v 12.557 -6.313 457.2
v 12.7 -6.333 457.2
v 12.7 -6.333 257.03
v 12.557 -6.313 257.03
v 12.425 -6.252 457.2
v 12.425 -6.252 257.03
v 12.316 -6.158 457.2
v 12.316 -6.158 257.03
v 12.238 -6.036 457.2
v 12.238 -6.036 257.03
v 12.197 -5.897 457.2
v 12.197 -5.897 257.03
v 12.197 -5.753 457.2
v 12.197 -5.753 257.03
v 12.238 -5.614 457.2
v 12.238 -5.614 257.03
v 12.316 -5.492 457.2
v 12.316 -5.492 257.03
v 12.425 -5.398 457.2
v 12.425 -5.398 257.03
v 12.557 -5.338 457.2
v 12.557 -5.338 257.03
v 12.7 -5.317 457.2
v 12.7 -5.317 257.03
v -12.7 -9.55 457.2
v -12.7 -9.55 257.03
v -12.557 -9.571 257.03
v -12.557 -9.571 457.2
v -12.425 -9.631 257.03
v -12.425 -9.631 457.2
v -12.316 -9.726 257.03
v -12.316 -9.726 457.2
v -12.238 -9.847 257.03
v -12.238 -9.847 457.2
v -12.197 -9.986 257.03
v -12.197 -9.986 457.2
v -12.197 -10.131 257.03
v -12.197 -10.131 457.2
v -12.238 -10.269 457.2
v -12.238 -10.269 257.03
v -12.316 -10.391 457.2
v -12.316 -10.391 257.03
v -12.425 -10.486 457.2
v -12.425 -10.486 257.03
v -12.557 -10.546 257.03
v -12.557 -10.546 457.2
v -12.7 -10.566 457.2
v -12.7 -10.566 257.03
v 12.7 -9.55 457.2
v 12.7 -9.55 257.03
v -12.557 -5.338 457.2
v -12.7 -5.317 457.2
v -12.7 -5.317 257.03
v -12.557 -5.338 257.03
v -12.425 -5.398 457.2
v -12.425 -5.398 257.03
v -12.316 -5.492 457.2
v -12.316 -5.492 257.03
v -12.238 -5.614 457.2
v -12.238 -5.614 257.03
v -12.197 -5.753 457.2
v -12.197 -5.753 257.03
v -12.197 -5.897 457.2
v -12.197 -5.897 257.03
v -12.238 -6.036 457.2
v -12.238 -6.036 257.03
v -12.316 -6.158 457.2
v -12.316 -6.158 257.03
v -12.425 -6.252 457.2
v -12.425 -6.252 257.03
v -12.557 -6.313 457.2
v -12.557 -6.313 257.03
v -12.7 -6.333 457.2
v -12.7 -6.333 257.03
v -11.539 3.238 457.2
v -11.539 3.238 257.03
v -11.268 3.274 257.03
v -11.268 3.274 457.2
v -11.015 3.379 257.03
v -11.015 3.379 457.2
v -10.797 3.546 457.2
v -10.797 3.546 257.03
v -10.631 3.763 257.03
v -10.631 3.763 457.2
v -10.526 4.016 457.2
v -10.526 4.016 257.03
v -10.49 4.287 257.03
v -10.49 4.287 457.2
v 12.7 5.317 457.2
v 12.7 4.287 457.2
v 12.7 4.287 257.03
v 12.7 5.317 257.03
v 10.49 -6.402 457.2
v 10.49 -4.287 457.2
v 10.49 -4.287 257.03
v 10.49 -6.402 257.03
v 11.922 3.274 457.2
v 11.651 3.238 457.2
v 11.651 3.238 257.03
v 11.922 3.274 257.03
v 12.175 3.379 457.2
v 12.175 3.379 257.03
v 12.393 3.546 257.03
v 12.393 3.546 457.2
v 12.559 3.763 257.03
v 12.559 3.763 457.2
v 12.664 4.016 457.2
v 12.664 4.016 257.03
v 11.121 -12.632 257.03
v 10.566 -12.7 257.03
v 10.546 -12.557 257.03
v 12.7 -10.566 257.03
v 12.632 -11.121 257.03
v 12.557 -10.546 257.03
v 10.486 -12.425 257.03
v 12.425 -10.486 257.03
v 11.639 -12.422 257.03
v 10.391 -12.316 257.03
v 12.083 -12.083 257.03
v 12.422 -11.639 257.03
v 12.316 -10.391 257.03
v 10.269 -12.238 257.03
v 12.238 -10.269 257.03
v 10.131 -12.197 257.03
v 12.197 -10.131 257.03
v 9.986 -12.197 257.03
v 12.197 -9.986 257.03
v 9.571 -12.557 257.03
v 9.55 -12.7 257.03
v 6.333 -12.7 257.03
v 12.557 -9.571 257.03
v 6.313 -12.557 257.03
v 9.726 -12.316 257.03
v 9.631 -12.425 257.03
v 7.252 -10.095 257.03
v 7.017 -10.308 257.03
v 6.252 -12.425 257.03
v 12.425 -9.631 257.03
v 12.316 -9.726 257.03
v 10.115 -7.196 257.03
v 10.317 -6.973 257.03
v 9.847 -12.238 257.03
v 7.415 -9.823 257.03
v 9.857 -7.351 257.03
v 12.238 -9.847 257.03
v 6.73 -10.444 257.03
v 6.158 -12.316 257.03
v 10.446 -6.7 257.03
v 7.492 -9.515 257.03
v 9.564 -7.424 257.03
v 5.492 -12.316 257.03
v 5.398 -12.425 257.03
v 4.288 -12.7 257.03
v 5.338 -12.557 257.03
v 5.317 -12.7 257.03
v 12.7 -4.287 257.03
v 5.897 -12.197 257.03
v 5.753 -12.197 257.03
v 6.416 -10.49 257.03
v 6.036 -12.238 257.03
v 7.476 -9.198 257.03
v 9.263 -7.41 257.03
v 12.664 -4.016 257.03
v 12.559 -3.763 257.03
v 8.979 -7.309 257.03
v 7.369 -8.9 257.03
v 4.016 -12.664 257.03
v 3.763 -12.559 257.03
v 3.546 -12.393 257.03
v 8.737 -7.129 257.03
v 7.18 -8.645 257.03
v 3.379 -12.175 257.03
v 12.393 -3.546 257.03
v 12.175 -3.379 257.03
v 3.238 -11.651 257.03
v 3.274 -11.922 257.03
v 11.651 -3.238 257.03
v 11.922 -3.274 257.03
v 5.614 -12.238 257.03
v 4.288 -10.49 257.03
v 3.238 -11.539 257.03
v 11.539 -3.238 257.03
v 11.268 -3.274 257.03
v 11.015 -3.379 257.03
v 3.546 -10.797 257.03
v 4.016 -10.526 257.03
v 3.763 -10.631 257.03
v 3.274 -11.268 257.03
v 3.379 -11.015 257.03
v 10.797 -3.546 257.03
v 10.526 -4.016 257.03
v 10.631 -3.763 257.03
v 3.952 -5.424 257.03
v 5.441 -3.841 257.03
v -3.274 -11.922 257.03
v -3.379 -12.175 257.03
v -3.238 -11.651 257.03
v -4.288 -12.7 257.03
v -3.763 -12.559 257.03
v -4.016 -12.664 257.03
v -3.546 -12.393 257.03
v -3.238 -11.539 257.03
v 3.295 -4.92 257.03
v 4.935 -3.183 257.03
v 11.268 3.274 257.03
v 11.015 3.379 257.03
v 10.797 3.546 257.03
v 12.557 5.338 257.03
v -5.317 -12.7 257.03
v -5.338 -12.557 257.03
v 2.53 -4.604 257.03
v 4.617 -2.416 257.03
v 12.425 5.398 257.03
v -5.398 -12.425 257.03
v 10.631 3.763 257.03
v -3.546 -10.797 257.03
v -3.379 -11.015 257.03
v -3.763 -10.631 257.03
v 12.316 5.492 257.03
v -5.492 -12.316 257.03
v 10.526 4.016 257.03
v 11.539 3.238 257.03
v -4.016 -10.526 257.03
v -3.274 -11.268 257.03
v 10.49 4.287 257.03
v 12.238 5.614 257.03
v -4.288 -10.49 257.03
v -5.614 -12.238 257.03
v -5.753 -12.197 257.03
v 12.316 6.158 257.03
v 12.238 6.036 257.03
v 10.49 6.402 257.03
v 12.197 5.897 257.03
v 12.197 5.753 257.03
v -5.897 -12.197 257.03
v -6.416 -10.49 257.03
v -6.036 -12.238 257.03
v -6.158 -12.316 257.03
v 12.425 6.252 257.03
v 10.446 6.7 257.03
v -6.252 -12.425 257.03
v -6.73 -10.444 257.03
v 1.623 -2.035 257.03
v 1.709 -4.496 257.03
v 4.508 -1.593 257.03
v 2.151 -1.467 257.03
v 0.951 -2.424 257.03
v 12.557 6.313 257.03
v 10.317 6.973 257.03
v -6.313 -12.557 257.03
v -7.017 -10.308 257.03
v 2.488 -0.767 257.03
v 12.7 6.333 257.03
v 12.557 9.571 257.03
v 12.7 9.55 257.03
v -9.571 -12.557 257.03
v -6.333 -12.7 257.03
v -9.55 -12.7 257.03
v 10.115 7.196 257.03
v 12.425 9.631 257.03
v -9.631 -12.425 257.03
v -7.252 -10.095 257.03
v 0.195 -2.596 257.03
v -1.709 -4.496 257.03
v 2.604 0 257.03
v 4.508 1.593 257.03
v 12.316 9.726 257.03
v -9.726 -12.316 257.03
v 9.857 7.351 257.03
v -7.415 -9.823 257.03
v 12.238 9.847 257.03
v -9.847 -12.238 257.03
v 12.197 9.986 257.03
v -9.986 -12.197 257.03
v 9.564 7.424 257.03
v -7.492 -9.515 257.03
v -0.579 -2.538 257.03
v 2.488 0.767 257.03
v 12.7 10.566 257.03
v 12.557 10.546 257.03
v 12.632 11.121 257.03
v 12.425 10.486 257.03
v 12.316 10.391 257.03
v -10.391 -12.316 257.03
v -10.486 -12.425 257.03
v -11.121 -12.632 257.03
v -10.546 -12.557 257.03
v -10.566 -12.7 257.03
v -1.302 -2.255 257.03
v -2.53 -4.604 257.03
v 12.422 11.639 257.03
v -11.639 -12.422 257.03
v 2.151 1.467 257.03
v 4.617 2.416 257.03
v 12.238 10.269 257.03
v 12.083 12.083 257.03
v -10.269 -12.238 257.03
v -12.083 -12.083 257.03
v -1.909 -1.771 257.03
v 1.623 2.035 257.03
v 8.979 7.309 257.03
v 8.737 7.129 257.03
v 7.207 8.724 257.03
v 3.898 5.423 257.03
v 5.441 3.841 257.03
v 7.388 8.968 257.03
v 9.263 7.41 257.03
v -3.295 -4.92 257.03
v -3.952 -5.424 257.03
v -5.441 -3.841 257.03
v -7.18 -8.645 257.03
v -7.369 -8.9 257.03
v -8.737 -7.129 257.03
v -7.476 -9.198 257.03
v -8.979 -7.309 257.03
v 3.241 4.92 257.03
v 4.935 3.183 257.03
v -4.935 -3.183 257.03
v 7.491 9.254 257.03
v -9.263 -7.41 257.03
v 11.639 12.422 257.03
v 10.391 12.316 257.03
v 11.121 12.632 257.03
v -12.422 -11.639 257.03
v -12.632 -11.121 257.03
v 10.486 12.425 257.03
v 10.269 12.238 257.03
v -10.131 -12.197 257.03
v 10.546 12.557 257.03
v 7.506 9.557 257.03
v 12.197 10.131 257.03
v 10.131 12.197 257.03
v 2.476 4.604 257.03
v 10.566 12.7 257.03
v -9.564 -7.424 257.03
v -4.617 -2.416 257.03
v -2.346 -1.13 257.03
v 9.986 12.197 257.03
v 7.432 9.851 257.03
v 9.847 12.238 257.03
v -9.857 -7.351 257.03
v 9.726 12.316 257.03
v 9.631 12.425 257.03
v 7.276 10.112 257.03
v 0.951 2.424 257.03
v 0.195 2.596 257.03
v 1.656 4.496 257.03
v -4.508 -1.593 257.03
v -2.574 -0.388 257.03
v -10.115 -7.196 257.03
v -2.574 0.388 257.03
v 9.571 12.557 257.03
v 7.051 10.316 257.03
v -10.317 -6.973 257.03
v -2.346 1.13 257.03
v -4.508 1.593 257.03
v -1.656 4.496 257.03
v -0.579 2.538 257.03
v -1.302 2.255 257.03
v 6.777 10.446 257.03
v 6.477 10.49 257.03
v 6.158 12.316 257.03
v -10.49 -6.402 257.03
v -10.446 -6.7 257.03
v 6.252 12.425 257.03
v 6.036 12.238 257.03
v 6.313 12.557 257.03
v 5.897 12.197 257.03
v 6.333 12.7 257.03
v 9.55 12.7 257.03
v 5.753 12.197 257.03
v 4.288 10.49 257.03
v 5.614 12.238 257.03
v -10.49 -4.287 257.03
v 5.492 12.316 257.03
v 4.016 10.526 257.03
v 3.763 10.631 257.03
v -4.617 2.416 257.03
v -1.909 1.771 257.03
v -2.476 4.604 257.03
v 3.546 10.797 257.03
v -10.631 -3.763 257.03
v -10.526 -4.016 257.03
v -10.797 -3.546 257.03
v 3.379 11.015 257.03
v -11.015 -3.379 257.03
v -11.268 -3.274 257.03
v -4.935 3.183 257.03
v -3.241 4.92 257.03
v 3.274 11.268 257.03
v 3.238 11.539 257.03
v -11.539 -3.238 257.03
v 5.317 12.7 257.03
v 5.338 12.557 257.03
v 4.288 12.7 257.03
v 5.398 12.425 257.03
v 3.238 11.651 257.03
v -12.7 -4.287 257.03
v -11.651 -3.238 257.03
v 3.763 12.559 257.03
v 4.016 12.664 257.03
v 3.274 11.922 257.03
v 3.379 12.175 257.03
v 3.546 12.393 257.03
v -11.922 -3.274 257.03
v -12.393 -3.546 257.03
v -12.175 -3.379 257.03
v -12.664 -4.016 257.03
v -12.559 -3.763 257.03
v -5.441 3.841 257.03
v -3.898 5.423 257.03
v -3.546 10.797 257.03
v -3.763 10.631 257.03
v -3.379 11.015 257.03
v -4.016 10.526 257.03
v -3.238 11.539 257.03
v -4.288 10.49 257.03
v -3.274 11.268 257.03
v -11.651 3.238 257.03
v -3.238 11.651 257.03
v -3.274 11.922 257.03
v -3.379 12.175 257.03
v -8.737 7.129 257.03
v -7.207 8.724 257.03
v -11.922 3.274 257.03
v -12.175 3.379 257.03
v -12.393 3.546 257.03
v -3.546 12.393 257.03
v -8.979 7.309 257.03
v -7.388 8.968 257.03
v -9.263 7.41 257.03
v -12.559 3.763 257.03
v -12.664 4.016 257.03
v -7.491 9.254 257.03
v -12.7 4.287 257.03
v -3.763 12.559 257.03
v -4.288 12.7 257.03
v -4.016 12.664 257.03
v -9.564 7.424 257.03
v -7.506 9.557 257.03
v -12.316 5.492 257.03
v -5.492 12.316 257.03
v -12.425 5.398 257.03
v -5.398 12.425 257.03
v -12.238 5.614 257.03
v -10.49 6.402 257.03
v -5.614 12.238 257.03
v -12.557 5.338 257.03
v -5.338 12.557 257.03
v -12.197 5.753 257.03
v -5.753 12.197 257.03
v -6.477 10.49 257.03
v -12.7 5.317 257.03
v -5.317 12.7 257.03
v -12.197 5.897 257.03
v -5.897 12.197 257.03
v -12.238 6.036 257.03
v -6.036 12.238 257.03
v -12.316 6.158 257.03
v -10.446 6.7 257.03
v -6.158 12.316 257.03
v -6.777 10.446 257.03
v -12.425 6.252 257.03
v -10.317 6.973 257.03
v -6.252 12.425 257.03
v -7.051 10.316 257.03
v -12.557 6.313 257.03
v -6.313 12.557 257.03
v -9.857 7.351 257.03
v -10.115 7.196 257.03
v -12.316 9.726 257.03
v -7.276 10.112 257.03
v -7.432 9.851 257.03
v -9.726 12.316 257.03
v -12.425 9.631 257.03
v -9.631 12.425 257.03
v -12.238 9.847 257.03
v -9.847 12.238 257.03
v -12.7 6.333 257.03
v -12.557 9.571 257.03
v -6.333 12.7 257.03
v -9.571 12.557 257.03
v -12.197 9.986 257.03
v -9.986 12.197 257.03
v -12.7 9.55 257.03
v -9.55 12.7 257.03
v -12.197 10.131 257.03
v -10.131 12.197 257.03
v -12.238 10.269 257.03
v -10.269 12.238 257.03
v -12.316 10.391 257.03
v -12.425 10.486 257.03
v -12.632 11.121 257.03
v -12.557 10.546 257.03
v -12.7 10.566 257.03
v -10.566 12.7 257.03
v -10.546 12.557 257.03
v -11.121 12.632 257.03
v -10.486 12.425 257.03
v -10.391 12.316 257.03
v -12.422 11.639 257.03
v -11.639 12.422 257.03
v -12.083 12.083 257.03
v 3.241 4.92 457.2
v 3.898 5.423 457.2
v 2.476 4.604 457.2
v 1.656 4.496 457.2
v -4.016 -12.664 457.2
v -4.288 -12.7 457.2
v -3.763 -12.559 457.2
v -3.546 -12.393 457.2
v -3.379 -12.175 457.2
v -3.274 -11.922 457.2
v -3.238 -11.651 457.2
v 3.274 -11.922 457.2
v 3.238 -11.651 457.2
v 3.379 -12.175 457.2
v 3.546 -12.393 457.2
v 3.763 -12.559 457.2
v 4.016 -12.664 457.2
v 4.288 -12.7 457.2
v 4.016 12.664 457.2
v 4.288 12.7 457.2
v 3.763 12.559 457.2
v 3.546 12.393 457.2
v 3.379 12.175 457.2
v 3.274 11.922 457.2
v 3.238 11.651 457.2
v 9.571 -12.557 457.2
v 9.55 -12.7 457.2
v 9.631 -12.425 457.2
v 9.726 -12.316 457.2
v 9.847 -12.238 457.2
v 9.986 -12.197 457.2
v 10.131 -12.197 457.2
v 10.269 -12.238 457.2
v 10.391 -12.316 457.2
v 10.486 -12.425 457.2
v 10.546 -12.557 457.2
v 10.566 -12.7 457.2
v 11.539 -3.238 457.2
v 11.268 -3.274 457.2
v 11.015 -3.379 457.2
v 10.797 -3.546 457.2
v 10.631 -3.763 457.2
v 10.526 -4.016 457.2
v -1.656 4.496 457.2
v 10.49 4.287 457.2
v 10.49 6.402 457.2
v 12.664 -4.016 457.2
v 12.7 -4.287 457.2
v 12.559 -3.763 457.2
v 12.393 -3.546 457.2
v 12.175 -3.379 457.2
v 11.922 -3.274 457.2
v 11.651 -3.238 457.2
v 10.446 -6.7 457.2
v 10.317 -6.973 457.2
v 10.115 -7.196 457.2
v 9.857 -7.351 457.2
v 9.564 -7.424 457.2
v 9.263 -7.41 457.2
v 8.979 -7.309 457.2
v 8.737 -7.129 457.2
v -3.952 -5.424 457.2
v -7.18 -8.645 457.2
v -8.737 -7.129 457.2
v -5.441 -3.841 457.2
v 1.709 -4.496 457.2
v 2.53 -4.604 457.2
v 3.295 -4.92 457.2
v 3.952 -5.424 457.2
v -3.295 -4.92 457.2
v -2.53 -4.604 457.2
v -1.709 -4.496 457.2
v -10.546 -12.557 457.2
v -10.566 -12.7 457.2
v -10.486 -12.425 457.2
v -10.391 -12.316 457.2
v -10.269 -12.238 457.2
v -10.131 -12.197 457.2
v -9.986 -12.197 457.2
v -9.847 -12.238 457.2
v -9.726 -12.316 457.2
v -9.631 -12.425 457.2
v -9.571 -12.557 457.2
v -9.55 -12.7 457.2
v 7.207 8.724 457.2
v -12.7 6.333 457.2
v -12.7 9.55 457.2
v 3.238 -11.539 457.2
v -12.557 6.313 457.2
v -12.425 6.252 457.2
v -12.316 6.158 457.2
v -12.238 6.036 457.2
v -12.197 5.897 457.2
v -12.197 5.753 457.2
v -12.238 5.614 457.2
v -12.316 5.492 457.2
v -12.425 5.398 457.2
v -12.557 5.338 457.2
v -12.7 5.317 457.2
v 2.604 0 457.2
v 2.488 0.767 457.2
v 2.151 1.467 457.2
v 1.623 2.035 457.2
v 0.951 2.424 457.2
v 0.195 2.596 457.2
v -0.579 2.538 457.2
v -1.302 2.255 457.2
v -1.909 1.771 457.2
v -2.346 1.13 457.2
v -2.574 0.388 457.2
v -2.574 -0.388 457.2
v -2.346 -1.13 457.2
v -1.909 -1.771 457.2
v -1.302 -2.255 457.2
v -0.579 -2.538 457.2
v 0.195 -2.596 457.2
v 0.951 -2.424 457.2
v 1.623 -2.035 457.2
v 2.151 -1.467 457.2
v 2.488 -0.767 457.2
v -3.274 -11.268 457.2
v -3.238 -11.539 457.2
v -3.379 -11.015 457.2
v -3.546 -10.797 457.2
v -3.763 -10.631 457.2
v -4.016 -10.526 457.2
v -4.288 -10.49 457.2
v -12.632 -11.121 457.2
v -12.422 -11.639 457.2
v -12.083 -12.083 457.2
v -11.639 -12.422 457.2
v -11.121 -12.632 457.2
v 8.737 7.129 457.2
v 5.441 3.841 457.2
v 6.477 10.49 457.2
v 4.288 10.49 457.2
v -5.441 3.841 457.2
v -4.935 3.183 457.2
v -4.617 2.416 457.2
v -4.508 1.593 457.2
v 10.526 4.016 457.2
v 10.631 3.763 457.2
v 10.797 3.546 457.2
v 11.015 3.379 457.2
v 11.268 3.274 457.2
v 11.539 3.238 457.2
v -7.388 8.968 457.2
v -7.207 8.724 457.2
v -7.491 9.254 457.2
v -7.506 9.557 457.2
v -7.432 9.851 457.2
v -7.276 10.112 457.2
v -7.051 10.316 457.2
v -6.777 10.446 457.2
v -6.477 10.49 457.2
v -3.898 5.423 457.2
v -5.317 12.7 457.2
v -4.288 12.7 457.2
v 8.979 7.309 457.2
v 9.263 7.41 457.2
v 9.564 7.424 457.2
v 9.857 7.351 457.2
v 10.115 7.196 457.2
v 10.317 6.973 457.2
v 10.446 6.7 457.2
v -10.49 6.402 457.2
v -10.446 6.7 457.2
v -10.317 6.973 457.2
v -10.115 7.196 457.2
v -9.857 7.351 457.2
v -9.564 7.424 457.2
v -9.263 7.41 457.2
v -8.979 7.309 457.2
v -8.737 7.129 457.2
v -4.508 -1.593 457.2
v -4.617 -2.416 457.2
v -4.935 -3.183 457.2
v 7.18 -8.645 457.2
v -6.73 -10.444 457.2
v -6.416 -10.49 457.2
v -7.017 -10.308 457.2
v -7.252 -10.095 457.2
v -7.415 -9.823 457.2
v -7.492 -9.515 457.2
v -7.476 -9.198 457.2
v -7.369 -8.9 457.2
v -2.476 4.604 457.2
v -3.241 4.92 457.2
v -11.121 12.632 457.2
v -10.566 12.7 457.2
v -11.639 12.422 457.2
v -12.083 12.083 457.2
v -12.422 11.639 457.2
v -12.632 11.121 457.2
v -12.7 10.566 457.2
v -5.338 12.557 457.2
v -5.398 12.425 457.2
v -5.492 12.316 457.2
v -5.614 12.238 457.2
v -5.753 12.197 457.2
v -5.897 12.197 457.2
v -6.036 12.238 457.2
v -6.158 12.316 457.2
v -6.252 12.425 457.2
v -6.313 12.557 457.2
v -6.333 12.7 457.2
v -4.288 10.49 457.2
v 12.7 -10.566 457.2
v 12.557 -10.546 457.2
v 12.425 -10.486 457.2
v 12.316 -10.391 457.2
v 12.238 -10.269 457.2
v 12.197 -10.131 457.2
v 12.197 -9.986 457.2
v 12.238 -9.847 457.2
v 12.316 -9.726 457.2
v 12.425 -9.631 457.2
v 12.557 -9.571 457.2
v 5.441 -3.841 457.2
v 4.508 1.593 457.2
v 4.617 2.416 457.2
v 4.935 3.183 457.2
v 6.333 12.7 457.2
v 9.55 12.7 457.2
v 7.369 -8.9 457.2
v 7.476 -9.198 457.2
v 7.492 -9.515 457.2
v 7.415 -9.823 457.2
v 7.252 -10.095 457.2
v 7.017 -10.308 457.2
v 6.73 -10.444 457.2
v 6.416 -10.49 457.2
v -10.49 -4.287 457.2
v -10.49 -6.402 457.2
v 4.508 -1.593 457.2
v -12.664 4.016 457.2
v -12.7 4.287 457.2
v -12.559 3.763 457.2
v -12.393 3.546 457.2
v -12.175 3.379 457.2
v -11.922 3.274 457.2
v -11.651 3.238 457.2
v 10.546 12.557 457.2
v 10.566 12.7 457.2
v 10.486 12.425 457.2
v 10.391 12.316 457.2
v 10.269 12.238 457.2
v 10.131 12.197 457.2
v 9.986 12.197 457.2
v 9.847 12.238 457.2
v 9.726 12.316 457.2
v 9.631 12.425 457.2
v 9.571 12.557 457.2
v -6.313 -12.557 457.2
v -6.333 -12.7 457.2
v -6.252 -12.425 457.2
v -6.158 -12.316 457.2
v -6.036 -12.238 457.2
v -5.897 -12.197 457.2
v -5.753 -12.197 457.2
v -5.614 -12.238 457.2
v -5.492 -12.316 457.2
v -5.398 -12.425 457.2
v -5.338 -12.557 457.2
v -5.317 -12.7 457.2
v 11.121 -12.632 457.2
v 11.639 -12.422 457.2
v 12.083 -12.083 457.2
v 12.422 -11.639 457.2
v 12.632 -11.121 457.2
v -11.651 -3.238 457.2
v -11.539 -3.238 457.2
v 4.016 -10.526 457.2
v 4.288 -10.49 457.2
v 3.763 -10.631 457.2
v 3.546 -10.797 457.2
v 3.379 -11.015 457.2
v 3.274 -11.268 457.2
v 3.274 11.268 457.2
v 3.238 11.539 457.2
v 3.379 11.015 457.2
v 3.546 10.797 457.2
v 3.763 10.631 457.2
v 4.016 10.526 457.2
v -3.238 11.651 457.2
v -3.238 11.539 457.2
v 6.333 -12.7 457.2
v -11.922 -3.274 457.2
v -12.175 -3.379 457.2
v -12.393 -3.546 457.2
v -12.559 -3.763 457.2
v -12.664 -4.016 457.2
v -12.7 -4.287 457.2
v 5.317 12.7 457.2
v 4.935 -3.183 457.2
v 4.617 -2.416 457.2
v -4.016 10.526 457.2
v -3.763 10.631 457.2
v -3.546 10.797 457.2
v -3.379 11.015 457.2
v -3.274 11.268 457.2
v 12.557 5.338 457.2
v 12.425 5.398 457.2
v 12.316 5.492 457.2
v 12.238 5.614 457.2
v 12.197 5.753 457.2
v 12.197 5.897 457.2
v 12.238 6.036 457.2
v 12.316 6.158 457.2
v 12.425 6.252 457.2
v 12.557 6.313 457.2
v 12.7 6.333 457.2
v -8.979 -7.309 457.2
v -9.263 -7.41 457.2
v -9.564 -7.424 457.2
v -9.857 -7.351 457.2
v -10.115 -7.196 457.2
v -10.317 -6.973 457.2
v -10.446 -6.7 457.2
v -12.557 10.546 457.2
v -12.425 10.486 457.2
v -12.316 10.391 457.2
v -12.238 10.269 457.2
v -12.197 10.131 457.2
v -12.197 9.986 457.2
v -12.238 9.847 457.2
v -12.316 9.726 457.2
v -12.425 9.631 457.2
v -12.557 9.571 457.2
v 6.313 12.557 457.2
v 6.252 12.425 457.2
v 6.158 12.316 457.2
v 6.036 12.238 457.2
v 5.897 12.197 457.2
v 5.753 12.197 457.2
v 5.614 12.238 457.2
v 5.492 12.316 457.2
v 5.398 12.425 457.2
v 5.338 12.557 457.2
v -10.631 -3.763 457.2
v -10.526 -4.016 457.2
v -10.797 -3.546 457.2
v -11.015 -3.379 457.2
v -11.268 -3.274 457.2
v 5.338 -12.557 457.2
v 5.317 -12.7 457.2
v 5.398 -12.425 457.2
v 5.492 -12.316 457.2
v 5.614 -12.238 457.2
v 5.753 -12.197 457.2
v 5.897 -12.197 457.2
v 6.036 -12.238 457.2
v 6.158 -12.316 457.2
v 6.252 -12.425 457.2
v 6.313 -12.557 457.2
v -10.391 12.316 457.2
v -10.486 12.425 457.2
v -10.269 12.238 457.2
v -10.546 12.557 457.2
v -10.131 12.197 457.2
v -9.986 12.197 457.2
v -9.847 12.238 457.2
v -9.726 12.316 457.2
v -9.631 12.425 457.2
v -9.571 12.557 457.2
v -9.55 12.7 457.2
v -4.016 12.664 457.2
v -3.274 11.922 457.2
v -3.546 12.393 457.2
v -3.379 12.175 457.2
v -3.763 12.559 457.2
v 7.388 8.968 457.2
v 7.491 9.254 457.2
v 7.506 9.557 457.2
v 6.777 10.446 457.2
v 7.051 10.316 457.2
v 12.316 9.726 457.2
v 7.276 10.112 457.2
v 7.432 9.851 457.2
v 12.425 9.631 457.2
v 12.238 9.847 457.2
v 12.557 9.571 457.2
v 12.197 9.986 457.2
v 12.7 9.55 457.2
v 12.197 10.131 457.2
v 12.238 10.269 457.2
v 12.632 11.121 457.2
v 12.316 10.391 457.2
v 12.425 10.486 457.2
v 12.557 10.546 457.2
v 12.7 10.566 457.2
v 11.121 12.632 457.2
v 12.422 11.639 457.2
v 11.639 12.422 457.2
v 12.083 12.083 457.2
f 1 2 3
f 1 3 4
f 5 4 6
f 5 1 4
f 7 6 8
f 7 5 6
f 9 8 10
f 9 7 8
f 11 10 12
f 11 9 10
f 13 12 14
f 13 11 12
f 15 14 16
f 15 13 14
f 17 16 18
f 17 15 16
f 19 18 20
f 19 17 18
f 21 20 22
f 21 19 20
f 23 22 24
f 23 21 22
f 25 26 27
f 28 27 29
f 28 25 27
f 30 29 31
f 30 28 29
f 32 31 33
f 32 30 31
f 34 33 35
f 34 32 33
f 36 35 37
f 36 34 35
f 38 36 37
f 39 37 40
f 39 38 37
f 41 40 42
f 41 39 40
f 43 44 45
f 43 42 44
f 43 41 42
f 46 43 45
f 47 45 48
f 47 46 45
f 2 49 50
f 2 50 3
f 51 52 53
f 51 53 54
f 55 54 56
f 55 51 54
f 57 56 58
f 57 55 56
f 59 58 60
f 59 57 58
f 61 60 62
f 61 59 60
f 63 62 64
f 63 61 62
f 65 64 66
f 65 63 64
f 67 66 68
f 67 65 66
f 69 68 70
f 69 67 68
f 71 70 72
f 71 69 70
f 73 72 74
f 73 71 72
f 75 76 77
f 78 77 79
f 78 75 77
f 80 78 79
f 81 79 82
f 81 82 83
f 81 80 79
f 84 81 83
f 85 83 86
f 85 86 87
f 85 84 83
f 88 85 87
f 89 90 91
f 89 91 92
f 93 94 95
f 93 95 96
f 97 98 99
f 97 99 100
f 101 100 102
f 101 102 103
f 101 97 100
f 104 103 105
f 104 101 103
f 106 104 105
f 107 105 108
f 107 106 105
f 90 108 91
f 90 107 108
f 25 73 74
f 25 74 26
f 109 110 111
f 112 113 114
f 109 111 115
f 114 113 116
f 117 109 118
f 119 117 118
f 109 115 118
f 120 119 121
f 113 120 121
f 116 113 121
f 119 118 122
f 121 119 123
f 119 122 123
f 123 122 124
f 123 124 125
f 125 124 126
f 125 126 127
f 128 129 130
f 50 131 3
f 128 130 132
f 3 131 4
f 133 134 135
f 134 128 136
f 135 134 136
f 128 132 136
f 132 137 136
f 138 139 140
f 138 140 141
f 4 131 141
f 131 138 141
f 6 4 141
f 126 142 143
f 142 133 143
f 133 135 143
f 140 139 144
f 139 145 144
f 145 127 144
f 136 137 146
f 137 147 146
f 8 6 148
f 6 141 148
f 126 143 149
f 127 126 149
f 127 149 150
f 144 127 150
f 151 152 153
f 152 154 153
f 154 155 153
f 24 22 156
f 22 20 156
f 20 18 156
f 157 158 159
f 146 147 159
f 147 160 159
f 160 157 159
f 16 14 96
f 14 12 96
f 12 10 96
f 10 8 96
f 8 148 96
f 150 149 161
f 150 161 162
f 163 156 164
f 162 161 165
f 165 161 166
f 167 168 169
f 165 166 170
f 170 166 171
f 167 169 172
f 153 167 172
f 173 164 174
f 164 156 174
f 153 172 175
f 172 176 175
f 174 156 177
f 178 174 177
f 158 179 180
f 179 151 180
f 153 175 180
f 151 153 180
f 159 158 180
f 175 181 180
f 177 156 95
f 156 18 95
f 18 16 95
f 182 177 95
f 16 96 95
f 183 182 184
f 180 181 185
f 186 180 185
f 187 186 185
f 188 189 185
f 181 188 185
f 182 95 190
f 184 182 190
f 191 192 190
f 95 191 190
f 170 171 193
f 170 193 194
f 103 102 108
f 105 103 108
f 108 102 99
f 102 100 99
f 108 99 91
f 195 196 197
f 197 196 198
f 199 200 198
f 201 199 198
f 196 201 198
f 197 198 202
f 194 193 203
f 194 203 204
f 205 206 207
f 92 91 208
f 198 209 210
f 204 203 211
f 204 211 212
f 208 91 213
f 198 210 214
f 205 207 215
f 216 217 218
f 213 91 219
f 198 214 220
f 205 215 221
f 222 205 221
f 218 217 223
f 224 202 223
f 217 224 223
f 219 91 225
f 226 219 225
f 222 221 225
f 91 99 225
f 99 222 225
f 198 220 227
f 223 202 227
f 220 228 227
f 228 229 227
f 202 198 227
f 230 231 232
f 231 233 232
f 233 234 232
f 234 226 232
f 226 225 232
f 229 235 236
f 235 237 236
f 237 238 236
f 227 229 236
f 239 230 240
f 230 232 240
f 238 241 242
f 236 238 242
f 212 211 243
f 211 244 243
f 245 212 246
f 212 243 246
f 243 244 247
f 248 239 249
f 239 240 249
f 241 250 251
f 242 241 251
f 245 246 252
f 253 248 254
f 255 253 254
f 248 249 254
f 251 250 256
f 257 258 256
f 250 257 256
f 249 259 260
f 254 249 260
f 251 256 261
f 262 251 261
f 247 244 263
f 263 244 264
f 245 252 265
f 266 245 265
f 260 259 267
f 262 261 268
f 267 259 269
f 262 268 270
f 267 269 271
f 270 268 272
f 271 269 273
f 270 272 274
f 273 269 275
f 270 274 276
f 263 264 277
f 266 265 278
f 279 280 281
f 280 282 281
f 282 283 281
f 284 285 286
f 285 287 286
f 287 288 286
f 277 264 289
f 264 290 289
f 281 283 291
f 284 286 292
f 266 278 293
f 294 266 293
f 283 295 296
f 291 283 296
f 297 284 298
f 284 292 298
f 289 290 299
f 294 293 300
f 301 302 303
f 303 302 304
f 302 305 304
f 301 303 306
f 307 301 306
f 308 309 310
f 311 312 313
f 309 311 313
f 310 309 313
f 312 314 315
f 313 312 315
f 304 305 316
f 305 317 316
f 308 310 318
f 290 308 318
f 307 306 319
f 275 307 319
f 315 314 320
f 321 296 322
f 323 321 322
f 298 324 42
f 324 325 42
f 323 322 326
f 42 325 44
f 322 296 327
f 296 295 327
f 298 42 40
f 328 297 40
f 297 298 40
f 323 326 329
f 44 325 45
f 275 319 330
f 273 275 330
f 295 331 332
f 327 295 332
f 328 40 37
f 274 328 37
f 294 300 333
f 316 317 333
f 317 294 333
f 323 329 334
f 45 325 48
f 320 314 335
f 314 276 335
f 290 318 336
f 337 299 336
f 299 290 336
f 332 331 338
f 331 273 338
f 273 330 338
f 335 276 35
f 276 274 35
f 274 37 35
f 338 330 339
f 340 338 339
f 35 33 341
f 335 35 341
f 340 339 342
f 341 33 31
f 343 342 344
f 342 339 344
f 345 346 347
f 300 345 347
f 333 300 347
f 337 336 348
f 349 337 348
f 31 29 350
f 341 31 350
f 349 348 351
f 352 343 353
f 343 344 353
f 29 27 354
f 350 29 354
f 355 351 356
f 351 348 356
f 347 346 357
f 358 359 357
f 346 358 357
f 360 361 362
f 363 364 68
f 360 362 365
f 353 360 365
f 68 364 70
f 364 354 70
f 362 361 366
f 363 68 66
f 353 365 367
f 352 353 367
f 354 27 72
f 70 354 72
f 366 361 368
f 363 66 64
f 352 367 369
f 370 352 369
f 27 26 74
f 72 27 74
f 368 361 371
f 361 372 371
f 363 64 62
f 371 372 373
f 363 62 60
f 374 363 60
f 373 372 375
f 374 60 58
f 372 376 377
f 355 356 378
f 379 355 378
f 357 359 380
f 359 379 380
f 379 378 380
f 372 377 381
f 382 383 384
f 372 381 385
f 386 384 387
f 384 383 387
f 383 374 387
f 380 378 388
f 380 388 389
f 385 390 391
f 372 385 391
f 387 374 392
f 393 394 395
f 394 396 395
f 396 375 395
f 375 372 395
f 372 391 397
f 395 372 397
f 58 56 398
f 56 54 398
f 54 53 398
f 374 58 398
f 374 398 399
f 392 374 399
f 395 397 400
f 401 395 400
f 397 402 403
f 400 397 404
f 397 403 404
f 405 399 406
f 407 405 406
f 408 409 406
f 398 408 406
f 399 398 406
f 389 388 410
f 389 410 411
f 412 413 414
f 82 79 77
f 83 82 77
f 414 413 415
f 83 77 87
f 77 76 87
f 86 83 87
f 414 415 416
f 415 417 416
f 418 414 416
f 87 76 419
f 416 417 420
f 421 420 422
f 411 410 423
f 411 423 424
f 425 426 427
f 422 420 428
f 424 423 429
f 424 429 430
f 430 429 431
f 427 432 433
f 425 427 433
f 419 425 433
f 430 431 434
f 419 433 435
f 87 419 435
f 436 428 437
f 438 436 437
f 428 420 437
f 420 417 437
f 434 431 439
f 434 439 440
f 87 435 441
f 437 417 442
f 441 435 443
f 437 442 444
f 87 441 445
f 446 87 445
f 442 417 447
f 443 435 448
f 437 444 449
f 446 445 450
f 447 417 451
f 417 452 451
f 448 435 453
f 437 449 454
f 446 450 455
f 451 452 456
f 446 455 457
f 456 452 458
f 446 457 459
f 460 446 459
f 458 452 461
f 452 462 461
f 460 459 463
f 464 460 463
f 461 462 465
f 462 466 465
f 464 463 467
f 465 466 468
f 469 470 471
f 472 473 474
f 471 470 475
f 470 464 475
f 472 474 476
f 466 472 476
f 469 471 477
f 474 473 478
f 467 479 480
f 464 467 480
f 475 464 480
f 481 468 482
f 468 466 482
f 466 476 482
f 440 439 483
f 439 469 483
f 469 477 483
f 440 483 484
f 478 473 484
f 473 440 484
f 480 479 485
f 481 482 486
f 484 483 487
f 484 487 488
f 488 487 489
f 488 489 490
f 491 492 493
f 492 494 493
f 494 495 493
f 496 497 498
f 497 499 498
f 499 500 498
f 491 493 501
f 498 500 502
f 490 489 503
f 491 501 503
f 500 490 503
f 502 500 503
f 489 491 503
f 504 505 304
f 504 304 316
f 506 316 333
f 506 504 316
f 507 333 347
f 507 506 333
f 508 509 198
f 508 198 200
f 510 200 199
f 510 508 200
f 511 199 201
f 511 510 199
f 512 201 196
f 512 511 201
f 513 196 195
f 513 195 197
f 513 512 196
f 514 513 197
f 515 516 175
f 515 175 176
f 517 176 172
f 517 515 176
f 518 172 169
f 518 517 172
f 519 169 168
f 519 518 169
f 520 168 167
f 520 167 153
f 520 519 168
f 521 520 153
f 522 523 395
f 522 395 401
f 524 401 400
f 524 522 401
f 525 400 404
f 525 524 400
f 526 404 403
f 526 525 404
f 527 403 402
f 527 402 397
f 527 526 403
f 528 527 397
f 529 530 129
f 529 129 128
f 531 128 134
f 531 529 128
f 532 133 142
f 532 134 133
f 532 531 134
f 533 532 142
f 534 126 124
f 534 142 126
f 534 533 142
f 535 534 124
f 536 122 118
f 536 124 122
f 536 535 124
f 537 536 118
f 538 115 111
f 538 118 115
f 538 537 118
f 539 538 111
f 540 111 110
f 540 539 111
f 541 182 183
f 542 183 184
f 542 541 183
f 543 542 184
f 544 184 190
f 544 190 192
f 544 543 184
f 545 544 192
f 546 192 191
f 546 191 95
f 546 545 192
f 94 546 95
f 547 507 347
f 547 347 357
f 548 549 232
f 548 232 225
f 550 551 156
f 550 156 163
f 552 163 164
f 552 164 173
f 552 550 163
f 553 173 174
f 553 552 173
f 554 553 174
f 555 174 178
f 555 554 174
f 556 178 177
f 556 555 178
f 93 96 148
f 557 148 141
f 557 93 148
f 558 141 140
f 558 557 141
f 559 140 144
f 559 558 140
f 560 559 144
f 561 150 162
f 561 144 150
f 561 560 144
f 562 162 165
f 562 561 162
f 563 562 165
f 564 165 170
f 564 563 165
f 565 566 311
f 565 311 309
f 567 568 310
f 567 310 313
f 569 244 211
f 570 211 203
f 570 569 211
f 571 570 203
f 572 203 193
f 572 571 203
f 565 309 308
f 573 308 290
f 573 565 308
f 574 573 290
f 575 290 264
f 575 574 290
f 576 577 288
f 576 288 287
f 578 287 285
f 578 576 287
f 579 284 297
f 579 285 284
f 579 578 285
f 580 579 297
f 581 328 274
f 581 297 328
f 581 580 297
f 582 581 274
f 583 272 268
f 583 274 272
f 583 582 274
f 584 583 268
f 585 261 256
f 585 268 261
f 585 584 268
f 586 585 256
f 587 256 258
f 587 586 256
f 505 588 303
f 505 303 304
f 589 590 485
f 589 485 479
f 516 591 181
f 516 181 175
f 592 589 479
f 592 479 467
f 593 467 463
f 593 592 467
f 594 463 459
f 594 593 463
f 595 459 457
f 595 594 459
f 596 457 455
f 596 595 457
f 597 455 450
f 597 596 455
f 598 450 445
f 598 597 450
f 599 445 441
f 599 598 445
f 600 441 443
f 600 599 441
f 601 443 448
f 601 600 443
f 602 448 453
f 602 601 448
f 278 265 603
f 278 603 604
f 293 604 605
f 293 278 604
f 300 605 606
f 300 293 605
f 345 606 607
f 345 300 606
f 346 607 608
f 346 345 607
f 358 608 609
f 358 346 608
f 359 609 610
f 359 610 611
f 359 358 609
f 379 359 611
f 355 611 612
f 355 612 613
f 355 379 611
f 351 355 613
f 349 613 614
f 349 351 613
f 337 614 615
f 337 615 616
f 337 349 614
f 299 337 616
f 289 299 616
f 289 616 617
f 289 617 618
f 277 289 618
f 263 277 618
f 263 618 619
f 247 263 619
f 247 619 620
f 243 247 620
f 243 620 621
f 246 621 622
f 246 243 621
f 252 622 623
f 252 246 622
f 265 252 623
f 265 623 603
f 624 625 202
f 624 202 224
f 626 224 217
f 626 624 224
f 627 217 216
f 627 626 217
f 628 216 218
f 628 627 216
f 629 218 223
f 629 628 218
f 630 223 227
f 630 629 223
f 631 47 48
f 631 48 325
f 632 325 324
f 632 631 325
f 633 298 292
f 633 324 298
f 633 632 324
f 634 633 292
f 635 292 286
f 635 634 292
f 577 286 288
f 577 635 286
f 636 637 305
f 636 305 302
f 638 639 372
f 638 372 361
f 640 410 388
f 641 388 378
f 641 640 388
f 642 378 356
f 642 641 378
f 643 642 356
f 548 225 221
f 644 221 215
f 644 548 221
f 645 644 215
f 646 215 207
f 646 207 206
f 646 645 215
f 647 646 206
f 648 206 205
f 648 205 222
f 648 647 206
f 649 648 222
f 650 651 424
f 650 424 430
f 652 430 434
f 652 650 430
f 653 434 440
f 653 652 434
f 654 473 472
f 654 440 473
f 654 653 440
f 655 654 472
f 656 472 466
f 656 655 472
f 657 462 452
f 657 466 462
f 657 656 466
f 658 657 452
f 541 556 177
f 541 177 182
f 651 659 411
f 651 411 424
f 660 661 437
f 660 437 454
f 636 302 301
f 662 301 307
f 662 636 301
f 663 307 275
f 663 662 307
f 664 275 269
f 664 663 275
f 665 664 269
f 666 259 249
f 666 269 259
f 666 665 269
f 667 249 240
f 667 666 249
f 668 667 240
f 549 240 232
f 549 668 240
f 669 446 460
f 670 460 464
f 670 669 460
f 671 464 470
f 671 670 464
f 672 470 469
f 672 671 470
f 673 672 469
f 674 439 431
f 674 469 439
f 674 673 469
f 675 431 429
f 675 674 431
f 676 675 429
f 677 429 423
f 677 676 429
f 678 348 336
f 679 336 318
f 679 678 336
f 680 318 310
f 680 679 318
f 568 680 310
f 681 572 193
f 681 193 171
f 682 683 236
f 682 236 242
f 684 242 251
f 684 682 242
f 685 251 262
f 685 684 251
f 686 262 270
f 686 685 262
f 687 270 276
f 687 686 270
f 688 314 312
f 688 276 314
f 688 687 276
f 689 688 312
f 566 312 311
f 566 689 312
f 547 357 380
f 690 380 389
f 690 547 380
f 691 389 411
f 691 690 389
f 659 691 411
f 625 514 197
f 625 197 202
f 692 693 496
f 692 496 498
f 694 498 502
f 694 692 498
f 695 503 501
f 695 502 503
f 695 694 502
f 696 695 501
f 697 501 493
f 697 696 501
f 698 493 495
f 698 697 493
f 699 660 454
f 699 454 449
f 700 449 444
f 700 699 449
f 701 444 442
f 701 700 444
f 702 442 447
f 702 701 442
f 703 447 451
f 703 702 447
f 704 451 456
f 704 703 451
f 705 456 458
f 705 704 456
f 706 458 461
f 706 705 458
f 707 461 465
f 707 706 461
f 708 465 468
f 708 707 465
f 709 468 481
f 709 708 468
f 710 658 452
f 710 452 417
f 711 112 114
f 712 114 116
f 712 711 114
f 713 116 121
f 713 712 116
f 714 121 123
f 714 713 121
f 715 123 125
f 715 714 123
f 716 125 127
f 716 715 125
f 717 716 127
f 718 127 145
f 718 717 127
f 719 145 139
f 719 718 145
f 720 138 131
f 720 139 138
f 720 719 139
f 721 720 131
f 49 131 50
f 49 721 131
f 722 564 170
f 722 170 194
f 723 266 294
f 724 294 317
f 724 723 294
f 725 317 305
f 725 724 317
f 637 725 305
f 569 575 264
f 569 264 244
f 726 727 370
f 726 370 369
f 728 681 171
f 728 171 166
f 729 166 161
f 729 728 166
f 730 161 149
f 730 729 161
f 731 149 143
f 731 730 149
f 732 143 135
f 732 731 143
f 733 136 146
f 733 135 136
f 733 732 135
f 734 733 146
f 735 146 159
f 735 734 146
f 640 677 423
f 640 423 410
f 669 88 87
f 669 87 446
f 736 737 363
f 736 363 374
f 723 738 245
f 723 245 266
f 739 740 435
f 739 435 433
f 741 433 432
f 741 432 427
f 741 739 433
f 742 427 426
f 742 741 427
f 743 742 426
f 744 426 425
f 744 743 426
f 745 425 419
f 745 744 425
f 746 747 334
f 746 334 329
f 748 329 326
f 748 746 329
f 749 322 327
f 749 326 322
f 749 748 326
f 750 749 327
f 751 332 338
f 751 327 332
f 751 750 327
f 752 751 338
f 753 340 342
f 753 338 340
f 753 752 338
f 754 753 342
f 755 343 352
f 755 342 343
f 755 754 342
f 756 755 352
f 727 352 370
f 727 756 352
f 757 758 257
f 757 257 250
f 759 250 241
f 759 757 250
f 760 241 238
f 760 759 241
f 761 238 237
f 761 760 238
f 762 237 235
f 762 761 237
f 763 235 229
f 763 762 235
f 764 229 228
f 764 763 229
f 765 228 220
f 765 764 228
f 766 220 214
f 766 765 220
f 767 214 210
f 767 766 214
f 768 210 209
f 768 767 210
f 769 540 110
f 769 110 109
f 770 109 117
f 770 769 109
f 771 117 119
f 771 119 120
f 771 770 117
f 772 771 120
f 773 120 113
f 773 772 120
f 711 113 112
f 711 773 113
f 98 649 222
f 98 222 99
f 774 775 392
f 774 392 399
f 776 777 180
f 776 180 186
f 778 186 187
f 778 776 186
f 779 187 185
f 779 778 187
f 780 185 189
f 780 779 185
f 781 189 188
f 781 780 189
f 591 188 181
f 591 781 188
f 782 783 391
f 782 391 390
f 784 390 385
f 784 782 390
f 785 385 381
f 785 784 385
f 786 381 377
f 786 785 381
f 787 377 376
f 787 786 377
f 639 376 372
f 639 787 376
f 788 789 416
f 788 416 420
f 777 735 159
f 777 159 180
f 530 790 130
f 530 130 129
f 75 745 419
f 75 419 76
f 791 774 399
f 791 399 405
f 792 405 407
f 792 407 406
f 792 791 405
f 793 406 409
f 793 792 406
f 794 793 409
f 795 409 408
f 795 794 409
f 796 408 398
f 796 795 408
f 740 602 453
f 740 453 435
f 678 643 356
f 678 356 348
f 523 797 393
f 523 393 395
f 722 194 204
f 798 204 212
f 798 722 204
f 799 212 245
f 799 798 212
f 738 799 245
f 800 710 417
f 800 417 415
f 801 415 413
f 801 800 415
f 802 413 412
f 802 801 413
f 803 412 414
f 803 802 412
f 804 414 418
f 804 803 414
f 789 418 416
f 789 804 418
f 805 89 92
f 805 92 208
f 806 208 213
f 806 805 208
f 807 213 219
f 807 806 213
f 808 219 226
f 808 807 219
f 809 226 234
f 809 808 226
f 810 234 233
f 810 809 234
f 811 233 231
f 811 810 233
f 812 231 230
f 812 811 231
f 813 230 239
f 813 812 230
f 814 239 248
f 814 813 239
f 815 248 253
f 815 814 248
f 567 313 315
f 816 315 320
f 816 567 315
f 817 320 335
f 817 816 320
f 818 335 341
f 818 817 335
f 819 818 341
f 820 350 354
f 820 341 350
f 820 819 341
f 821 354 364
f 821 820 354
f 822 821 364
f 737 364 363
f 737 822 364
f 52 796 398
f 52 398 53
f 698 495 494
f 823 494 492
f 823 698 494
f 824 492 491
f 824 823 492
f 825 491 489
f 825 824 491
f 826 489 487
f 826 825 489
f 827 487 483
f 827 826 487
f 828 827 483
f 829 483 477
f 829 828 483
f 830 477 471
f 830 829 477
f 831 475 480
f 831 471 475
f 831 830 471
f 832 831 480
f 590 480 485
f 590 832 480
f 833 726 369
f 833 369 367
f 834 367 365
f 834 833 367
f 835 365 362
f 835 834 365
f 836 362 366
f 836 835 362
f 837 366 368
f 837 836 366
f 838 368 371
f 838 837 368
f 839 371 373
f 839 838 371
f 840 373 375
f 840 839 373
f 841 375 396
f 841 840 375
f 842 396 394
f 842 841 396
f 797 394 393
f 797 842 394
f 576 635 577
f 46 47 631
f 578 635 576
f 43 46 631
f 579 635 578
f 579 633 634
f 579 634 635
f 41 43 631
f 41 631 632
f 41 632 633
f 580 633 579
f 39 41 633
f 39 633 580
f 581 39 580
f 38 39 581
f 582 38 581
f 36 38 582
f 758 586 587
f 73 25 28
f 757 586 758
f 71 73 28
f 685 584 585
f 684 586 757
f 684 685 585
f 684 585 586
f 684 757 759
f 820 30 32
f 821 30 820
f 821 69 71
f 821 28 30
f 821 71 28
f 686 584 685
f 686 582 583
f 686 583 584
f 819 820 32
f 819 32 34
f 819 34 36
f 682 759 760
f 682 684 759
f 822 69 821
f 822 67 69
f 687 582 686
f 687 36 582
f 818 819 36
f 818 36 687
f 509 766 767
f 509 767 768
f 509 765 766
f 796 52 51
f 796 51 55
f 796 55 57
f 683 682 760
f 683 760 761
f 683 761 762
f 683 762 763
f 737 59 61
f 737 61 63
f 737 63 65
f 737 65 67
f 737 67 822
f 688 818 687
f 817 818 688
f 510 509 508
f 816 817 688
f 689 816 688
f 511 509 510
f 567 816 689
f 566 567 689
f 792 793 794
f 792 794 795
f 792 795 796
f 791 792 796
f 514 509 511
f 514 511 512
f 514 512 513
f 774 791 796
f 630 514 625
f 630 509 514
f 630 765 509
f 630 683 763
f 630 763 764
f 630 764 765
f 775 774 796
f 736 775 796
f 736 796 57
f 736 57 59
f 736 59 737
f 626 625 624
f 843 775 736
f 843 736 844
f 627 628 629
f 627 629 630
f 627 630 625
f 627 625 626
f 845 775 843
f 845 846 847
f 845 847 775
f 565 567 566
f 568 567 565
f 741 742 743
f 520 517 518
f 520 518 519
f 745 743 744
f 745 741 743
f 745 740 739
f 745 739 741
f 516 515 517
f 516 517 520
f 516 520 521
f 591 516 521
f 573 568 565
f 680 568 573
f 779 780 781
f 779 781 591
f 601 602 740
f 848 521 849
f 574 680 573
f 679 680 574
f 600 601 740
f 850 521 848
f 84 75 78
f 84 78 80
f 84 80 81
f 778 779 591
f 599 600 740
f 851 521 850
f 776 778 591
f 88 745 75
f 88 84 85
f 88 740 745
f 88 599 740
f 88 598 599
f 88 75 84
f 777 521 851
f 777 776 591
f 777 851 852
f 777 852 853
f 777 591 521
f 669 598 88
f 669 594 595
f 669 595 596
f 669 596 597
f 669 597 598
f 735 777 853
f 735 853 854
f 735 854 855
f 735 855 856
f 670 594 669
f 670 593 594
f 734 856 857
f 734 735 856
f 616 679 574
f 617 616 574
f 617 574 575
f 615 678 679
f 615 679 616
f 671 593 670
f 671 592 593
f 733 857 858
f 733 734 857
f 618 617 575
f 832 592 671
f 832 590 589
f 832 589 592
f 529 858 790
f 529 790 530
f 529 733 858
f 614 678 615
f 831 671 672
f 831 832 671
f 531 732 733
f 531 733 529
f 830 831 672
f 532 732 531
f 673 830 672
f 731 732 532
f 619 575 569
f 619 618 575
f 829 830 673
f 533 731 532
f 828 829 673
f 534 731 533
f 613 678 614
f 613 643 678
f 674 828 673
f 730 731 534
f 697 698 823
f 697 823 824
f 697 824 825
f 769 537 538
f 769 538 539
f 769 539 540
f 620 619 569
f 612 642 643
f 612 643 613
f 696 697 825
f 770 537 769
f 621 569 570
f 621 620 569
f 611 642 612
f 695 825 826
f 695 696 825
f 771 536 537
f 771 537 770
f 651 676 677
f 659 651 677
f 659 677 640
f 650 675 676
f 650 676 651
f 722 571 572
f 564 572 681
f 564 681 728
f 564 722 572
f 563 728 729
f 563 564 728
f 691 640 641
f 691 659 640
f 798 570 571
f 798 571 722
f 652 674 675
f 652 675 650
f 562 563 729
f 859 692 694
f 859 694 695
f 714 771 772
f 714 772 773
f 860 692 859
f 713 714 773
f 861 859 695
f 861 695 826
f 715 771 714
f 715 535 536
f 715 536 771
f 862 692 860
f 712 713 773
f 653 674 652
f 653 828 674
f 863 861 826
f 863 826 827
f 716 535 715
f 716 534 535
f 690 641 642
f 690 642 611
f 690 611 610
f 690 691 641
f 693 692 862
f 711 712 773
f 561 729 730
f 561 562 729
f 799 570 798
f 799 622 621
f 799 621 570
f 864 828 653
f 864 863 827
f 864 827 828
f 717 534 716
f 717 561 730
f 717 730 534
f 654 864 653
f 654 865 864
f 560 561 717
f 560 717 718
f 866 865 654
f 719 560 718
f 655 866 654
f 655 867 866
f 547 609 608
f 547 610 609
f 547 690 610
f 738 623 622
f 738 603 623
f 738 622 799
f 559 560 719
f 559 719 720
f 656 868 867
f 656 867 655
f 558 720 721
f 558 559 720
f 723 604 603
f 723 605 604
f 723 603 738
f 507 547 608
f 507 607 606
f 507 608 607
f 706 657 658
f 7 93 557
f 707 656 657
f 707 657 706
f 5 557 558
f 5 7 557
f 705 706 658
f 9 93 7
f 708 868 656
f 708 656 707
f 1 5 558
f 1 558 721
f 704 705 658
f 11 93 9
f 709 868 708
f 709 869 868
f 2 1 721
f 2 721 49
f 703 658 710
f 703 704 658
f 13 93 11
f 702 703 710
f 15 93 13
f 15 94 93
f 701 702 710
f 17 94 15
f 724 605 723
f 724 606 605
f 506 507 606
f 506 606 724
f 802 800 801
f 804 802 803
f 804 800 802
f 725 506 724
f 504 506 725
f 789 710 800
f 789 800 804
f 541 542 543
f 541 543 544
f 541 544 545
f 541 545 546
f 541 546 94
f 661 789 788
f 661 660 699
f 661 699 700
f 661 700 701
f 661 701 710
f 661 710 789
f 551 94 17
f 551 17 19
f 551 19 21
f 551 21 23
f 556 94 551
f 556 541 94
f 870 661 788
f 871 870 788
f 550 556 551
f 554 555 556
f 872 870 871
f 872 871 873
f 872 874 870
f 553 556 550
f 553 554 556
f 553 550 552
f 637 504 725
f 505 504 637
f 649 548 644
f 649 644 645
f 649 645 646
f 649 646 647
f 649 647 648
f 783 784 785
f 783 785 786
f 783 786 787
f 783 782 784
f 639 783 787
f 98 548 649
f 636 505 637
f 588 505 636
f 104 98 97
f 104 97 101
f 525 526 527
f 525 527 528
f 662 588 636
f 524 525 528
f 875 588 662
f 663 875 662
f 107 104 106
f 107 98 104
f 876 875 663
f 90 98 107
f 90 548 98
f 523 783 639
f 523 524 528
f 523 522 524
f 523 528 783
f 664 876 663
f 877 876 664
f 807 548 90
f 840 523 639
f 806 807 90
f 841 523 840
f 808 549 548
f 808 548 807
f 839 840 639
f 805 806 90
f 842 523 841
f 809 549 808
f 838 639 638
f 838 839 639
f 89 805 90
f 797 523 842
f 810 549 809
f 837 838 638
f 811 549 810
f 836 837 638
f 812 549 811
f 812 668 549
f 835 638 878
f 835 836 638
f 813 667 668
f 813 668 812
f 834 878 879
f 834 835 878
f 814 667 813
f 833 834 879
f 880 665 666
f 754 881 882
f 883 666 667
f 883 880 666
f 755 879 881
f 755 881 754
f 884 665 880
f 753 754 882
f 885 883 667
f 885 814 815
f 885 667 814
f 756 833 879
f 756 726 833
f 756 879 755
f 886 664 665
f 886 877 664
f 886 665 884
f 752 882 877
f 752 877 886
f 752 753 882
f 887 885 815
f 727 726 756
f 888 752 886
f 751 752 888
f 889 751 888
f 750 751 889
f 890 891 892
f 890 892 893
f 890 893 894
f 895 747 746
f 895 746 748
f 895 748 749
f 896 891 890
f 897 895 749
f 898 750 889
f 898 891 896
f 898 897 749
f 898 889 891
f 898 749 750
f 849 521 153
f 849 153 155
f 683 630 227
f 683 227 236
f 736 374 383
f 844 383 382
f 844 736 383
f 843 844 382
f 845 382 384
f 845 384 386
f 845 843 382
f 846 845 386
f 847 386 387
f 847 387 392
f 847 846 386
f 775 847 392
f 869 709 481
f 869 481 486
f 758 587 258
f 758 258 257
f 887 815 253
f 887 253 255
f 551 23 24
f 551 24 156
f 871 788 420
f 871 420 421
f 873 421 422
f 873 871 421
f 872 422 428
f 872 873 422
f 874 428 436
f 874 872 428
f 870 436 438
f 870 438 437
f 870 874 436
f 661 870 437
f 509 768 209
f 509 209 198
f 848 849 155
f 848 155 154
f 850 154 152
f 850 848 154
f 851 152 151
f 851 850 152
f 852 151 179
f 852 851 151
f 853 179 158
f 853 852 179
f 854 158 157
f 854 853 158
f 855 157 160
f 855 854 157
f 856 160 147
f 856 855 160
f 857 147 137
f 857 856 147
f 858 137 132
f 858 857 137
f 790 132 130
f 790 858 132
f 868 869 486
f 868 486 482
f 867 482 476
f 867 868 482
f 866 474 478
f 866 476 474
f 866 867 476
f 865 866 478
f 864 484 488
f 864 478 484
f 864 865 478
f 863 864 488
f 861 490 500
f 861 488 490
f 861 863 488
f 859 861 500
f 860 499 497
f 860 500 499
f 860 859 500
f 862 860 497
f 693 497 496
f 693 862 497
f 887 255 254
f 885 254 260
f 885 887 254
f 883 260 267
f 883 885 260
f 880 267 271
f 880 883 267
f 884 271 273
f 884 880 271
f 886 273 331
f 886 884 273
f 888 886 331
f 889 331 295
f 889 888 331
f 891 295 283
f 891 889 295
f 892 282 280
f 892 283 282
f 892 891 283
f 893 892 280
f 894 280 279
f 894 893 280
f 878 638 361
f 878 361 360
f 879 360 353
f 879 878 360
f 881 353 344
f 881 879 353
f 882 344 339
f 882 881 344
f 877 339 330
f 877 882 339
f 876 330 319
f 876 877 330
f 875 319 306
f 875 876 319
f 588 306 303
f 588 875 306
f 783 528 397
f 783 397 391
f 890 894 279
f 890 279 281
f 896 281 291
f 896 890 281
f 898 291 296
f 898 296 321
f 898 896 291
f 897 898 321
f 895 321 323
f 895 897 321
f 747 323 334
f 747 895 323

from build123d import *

# Parameters (mm, degrees)
SKETCH1_R               = 2.6035
BOSS_EXTRUDE1_DEPTH     = 457.2
CUT_EXTRUDE2_DEPTH      = 4.318
CUT_EXTRUDE2_DEPTH_BACK = 26.924


with BuildPart() as part:
    # Sketch1 → Boss-Extrude1 (new body, symmetric)
    with BuildSketch(Plane.XY):
        with BuildLine():
            Line((-7.179650497, -8.645192506), (-3.952270251, -5.423690499))
            ThreePointArc((-3.952270251, -5.423690499), (-2.922936451, -4.736929036), (-1.709253557, -4.4958))
            Line((-1.709253557, -4.4958), (1.709253557, -4.4958))
            ThreePointArc((1.709253557, -4.4958), (2.922936451, -4.736929036), (3.952270251, -5.423690499))
            Line((3.952270251, -5.423690499), (7.179650497, -8.645192506))
            ThreePointArc((7.179650497, -8.645192506), (7.41473083, -9.822813117), (6.416408329, -10.4902))
            Line((6.416408329, -10.4902), (4.287512407, -10.4902))
            ThreePointArc((4.287512407, -10.4902), (3.54574862, -10.79744862), (3.2385, -11.539212407))
            Line((3.2385, -11.539212407), (3.2385, -11.650987593))
            ThreePointArc((3.2385, -11.650987593), (3.54574862, -12.39275138), (4.287512407, -12.7))
            Line((4.287512407, -12.7), (5.317126718, -12.7))
            ThreePointArc((5.317126718, -12.7), (5.825126718, -12.192), (6.333126718, -12.7))
            Line((6.333126718, -12.7), (9.550443118, -12.7))
            ThreePointArc((9.550443118, -12.7), (10.058366869, -12.192000006), (10.566443095, -12.699847501))
            ThreePointArc((10.566443095, -12.699847501), (12.082537762, -12.08250727), (12.699846982, -10.566399977))
            ThreePointArc((12.699846982, -10.566399977), (12.192000006, -10.058323491), (12.7, -9.5504))
            Line((12.7, -9.5504), (12.7, -6.3330836))
            ThreePointArc((12.7, -6.3330836), (12.192, -5.8250836), (12.7, -5.3170836))
            Line((12.7, -5.3170836), (12.7, -4.287469289))
            ThreePointArc((12.7, -4.287469289), (12.39275138, -3.545705502), (11.650987593, -3.238456882))
            Line((11.650987593, -3.238456882), (11.539212407, -3.238456882))
            ThreePointArc((11.539212407, -3.238456882), (10.79744862, -3.545705502), (10.4902, -4.287469289))
            Line((10.4902, -4.287469289), (10.4902, -6.402089023))
            ThreePointArc((10.4902, -6.402089023), (9.856505071, -7.351067942), (8.737131347, -7.129408934))
            Line((8.737131347, -7.129408934), (5.441005833, -3.840816462))
            ThreePointArc((5.441005833, -3.840816462), (4.750877967, -2.809883091), (4.5085, -1.593185507))
            Line((4.5085, -1.593185507), (4.5085, 1.593185507))
            ThreePointArc((4.5085, 1.593185507), (4.750877967, 2.809883091), (5.441005833, 3.840816462))
            Line((5.441005833, 3.840816462), (8.737131347, 7.129408934))
            ThreePointArc((8.737131347, 7.129408934), (9.856505071, 7.351067942), (10.4902, 6.402089023))
            Line((10.4902, 6.402089023), (10.4902, 4.287469289))
            ThreePointArc((10.4902, 4.287469289), (10.79744862, 3.545705502), (11.539212407, 3.238456882))
            Line((11.539212407, 3.238456882), (11.650987593, 3.238456882))
            ThreePointArc((11.650987593, 3.238456882), (12.39275138, 3.545705502), (12.7, 4.287469289))
            Line((12.7, 4.287469289), (12.7, 5.3170836))
            ThreePointArc((12.7, 5.3170836), (12.192, 5.8250836), (12.7, 6.3330836))
            Line((12.7, 6.3330836), (12.7, 9.5504))
            ThreePointArc((12.7, 9.5504), (12.192000006, 10.058323491), (12.699846982, 10.566399977))
            ThreePointArc((12.699846982, 10.566399977), (12.082537762, 12.08250727), (10.566443095, 12.699847501))
            ThreePointArc((10.566443095, 12.699847501), (10.058366869, 12.192000006), (9.550443118, 12.7))
            Line((9.550443118, 12.7), (6.333126718, 12.7))
            ThreePointArc((6.333126718, 12.7), (5.825126718, 12.192), (5.317126718, 12.7))
            Line((5.317126718, 12.7), (4.287512407, 12.7))
            ThreePointArc((4.287512407, 12.7), (3.54574862, 12.39275138), (3.2385, 11.650987593))
            Line((3.2385, 11.650987593), (3.2385, 11.539212407))
            ThreePointArc((3.2385, 11.539212407), (3.54574862, 10.79744862), (4.287512407, 10.4902))
            Line((4.287512407, 10.4902), (6.476788598, 10.4902))
            ThreePointArc((6.476788598, 10.4902), (7.432222385, 9.85140422), (7.207036008, 8.724370562))
            Line((7.207036008, 8.724370562), (3.898272566, 5.423169045))
            ThreePointArc((3.898272566, 5.423169045), (2.869120213, 4.736787962), (1.655778399, 4.4958))
            Line((1.655778399, 4.4958), (-1.655778399, 4.4958))
            ThreePointArc((-1.655778399, 4.4958), (-2.869120213, 4.736787962), (-3.898272566, 5.423169045))
            Line((-3.898272566, 5.423169045), (-7.207036008, 8.724370562))
            ThreePointArc((-7.207036008, 8.724370562), (-7.432222385, 9.85140422), (-6.476788598, 10.4902))
            Line((-6.476788598, 10.4902), (-4.287512407, 10.4902))
            ThreePointArc((-4.287512407, 10.4902), (-3.54574862, 10.79744862), (-3.2385, 11.539212407))
            Line((-3.2385, 11.539212407), (-3.2385, 11.650987593))
            ThreePointArc((-3.2385, 11.650987593), (-3.54574862, 12.39275138), (-4.287512407, 12.7))
            Line((-4.287512407, 12.7), (-5.317126718, 12.7))
            ThreePointArc((-5.317126718, 12.7), (-5.825126718, 12.192), (-6.333126718, 12.7))
            Line((-6.333126718, 12.7), (-9.550443118, 12.7))
            ThreePointArc((-9.550443118, 12.7), (-10.058366869, 12.192000006), (-10.566443095, 12.699847501))
            ThreePointArc((-10.566443095, 12.699847501), (-12.082537762, 12.08250727), (-12.699846982, 10.566399977))
            ThreePointArc((-12.699846982, 10.566399977), (-12.192000006, 10.058323491), (-12.7, 9.5504))
            Line((-12.7, 9.5504), (-12.7, 6.3330836))
            ThreePointArc((-12.7, 6.3330836), (-12.192, 5.8250836), (-12.7, 5.3170836))
            Line((-12.7, 5.3170836), (-12.7, 4.287469289))
            ThreePointArc((-12.7, 4.287469289), (-12.39275138, 3.545705502), (-11.650987593, 3.238456882))
            Line((-11.650987593, 3.238456882), (-11.539212407, 3.238456882))
            ThreePointArc((-11.539212407, 3.238456882), (-10.79744862, 3.545705502), (-10.4902, 4.287469289))
            Line((-10.4902, 4.287469289), (-10.4902, 6.402089023))
            ThreePointArc((-10.4902, 6.402089023), (-9.856505071, 7.351067942), (-8.737131347, 7.129408934))
            Line((-8.737131347, 7.129408934), (-5.441005833, 3.840816462))
            ThreePointArc((-5.441005833, 3.840816462), (-4.750877967, 2.809883091), (-4.5085, 1.593185507))
            Line((-4.5085, 1.593185507), (-4.5085, -1.593185507))
            ThreePointArc((-4.5085, -1.593185507), (-4.750877967, -2.809883091), (-5.441005833, -3.840816462))
            Line((-5.441005833, -3.840816462), (-8.737131347, -7.129408934))
            ThreePointArc((-8.737131347, -7.129408934), (-9.856505071, -7.351067942), (-10.4902, -6.402089023))
            Line((-10.4902, -6.402089023), (-10.4902, -4.287469289))
            ThreePointArc((-10.4902, -4.287469289), (-10.79744862, -3.545705502), (-11.539212407, -3.238456882))
            Line((-11.539212407, -3.238456882), (-11.650987593, -3.238456882))
            ThreePointArc((-11.650987593, -3.238456882), (-12.39275138, -3.545705502), (-12.7, -4.287469289))
            Line((-12.7, -4.287469289), (-12.7, -5.3170836))
            ThreePointArc((-12.7, -5.3170836), (-12.192, -5.8250836), (-12.7, -6.3330836))
            Line((-12.7, -6.3330836), (-12.7, -9.5504))
            ThreePointArc((-12.7, -9.5504), (-12.192000006, -10.058323491), (-12.699846982, -10.566399977))
            ThreePointArc((-12.699846982, -10.566399977), (-12.082537762, -12.08250727), (-10.566443095, -12.699847501))
            ThreePointArc((-10.566443095, -12.699847501), (-10.058366869, -12.192000006), (-9.550443118, -12.7))
            Line((-9.550443118, -12.7), (-6.333126718, -12.7))
            ThreePointArc((-6.333126718, -12.7), (-5.825126718, -12.192), (-5.317126718, -12.7))
            Line((-5.317126718, -12.7), (-4.287512407, -12.7))
            ThreePointArc((-4.287512407, -12.7), (-3.54574862, -12.39275138), (-3.2385, -11.650987593))
            Line((-3.2385, -11.650987593), (-3.2385, -11.539212407))
            ThreePointArc((-3.2385, -11.539212407), (-3.54574862, -10.79744862), (-4.287512407, -10.4902))
            Line((-4.287512407, -10.4902), (-6.416408329, -10.4902))
            ThreePointArc((-6.416408329, -10.4902), (-7.41473083, -9.822813117), (-7.179650497, -8.645192506))
        make_face()
        Circle(SKETCH1_R, mode=Mode.SUBTRACT)
    extrude(amount=BOSS_EXTRUDE1_DEPTH, both=True)

    # Sketch3 → Cut-Extrude2 (cut, two sides)
    with BuildSketch(Plane.ZY.offset(12.7)) as cut_extrude2_sk:
        Polygon((-203.2, 21.063041056), (-461.090893327, 21.063041056), (-461.090893327, -25.4), (-203.2, -27.249602883), (257.029766368, -27.249602883), (257.029766368, 21.063041056), align=None)
    extrude(amount=CUT_EXTRUDE2_DEPTH, mode=Mode.SUBTRACT)
    extrude(cut_extrude2_sk.sketch, amount=-CUT_EXTRUDE2_DEPTH_BACK, mode=Mode.SUBTRACT)


solid = part.part
